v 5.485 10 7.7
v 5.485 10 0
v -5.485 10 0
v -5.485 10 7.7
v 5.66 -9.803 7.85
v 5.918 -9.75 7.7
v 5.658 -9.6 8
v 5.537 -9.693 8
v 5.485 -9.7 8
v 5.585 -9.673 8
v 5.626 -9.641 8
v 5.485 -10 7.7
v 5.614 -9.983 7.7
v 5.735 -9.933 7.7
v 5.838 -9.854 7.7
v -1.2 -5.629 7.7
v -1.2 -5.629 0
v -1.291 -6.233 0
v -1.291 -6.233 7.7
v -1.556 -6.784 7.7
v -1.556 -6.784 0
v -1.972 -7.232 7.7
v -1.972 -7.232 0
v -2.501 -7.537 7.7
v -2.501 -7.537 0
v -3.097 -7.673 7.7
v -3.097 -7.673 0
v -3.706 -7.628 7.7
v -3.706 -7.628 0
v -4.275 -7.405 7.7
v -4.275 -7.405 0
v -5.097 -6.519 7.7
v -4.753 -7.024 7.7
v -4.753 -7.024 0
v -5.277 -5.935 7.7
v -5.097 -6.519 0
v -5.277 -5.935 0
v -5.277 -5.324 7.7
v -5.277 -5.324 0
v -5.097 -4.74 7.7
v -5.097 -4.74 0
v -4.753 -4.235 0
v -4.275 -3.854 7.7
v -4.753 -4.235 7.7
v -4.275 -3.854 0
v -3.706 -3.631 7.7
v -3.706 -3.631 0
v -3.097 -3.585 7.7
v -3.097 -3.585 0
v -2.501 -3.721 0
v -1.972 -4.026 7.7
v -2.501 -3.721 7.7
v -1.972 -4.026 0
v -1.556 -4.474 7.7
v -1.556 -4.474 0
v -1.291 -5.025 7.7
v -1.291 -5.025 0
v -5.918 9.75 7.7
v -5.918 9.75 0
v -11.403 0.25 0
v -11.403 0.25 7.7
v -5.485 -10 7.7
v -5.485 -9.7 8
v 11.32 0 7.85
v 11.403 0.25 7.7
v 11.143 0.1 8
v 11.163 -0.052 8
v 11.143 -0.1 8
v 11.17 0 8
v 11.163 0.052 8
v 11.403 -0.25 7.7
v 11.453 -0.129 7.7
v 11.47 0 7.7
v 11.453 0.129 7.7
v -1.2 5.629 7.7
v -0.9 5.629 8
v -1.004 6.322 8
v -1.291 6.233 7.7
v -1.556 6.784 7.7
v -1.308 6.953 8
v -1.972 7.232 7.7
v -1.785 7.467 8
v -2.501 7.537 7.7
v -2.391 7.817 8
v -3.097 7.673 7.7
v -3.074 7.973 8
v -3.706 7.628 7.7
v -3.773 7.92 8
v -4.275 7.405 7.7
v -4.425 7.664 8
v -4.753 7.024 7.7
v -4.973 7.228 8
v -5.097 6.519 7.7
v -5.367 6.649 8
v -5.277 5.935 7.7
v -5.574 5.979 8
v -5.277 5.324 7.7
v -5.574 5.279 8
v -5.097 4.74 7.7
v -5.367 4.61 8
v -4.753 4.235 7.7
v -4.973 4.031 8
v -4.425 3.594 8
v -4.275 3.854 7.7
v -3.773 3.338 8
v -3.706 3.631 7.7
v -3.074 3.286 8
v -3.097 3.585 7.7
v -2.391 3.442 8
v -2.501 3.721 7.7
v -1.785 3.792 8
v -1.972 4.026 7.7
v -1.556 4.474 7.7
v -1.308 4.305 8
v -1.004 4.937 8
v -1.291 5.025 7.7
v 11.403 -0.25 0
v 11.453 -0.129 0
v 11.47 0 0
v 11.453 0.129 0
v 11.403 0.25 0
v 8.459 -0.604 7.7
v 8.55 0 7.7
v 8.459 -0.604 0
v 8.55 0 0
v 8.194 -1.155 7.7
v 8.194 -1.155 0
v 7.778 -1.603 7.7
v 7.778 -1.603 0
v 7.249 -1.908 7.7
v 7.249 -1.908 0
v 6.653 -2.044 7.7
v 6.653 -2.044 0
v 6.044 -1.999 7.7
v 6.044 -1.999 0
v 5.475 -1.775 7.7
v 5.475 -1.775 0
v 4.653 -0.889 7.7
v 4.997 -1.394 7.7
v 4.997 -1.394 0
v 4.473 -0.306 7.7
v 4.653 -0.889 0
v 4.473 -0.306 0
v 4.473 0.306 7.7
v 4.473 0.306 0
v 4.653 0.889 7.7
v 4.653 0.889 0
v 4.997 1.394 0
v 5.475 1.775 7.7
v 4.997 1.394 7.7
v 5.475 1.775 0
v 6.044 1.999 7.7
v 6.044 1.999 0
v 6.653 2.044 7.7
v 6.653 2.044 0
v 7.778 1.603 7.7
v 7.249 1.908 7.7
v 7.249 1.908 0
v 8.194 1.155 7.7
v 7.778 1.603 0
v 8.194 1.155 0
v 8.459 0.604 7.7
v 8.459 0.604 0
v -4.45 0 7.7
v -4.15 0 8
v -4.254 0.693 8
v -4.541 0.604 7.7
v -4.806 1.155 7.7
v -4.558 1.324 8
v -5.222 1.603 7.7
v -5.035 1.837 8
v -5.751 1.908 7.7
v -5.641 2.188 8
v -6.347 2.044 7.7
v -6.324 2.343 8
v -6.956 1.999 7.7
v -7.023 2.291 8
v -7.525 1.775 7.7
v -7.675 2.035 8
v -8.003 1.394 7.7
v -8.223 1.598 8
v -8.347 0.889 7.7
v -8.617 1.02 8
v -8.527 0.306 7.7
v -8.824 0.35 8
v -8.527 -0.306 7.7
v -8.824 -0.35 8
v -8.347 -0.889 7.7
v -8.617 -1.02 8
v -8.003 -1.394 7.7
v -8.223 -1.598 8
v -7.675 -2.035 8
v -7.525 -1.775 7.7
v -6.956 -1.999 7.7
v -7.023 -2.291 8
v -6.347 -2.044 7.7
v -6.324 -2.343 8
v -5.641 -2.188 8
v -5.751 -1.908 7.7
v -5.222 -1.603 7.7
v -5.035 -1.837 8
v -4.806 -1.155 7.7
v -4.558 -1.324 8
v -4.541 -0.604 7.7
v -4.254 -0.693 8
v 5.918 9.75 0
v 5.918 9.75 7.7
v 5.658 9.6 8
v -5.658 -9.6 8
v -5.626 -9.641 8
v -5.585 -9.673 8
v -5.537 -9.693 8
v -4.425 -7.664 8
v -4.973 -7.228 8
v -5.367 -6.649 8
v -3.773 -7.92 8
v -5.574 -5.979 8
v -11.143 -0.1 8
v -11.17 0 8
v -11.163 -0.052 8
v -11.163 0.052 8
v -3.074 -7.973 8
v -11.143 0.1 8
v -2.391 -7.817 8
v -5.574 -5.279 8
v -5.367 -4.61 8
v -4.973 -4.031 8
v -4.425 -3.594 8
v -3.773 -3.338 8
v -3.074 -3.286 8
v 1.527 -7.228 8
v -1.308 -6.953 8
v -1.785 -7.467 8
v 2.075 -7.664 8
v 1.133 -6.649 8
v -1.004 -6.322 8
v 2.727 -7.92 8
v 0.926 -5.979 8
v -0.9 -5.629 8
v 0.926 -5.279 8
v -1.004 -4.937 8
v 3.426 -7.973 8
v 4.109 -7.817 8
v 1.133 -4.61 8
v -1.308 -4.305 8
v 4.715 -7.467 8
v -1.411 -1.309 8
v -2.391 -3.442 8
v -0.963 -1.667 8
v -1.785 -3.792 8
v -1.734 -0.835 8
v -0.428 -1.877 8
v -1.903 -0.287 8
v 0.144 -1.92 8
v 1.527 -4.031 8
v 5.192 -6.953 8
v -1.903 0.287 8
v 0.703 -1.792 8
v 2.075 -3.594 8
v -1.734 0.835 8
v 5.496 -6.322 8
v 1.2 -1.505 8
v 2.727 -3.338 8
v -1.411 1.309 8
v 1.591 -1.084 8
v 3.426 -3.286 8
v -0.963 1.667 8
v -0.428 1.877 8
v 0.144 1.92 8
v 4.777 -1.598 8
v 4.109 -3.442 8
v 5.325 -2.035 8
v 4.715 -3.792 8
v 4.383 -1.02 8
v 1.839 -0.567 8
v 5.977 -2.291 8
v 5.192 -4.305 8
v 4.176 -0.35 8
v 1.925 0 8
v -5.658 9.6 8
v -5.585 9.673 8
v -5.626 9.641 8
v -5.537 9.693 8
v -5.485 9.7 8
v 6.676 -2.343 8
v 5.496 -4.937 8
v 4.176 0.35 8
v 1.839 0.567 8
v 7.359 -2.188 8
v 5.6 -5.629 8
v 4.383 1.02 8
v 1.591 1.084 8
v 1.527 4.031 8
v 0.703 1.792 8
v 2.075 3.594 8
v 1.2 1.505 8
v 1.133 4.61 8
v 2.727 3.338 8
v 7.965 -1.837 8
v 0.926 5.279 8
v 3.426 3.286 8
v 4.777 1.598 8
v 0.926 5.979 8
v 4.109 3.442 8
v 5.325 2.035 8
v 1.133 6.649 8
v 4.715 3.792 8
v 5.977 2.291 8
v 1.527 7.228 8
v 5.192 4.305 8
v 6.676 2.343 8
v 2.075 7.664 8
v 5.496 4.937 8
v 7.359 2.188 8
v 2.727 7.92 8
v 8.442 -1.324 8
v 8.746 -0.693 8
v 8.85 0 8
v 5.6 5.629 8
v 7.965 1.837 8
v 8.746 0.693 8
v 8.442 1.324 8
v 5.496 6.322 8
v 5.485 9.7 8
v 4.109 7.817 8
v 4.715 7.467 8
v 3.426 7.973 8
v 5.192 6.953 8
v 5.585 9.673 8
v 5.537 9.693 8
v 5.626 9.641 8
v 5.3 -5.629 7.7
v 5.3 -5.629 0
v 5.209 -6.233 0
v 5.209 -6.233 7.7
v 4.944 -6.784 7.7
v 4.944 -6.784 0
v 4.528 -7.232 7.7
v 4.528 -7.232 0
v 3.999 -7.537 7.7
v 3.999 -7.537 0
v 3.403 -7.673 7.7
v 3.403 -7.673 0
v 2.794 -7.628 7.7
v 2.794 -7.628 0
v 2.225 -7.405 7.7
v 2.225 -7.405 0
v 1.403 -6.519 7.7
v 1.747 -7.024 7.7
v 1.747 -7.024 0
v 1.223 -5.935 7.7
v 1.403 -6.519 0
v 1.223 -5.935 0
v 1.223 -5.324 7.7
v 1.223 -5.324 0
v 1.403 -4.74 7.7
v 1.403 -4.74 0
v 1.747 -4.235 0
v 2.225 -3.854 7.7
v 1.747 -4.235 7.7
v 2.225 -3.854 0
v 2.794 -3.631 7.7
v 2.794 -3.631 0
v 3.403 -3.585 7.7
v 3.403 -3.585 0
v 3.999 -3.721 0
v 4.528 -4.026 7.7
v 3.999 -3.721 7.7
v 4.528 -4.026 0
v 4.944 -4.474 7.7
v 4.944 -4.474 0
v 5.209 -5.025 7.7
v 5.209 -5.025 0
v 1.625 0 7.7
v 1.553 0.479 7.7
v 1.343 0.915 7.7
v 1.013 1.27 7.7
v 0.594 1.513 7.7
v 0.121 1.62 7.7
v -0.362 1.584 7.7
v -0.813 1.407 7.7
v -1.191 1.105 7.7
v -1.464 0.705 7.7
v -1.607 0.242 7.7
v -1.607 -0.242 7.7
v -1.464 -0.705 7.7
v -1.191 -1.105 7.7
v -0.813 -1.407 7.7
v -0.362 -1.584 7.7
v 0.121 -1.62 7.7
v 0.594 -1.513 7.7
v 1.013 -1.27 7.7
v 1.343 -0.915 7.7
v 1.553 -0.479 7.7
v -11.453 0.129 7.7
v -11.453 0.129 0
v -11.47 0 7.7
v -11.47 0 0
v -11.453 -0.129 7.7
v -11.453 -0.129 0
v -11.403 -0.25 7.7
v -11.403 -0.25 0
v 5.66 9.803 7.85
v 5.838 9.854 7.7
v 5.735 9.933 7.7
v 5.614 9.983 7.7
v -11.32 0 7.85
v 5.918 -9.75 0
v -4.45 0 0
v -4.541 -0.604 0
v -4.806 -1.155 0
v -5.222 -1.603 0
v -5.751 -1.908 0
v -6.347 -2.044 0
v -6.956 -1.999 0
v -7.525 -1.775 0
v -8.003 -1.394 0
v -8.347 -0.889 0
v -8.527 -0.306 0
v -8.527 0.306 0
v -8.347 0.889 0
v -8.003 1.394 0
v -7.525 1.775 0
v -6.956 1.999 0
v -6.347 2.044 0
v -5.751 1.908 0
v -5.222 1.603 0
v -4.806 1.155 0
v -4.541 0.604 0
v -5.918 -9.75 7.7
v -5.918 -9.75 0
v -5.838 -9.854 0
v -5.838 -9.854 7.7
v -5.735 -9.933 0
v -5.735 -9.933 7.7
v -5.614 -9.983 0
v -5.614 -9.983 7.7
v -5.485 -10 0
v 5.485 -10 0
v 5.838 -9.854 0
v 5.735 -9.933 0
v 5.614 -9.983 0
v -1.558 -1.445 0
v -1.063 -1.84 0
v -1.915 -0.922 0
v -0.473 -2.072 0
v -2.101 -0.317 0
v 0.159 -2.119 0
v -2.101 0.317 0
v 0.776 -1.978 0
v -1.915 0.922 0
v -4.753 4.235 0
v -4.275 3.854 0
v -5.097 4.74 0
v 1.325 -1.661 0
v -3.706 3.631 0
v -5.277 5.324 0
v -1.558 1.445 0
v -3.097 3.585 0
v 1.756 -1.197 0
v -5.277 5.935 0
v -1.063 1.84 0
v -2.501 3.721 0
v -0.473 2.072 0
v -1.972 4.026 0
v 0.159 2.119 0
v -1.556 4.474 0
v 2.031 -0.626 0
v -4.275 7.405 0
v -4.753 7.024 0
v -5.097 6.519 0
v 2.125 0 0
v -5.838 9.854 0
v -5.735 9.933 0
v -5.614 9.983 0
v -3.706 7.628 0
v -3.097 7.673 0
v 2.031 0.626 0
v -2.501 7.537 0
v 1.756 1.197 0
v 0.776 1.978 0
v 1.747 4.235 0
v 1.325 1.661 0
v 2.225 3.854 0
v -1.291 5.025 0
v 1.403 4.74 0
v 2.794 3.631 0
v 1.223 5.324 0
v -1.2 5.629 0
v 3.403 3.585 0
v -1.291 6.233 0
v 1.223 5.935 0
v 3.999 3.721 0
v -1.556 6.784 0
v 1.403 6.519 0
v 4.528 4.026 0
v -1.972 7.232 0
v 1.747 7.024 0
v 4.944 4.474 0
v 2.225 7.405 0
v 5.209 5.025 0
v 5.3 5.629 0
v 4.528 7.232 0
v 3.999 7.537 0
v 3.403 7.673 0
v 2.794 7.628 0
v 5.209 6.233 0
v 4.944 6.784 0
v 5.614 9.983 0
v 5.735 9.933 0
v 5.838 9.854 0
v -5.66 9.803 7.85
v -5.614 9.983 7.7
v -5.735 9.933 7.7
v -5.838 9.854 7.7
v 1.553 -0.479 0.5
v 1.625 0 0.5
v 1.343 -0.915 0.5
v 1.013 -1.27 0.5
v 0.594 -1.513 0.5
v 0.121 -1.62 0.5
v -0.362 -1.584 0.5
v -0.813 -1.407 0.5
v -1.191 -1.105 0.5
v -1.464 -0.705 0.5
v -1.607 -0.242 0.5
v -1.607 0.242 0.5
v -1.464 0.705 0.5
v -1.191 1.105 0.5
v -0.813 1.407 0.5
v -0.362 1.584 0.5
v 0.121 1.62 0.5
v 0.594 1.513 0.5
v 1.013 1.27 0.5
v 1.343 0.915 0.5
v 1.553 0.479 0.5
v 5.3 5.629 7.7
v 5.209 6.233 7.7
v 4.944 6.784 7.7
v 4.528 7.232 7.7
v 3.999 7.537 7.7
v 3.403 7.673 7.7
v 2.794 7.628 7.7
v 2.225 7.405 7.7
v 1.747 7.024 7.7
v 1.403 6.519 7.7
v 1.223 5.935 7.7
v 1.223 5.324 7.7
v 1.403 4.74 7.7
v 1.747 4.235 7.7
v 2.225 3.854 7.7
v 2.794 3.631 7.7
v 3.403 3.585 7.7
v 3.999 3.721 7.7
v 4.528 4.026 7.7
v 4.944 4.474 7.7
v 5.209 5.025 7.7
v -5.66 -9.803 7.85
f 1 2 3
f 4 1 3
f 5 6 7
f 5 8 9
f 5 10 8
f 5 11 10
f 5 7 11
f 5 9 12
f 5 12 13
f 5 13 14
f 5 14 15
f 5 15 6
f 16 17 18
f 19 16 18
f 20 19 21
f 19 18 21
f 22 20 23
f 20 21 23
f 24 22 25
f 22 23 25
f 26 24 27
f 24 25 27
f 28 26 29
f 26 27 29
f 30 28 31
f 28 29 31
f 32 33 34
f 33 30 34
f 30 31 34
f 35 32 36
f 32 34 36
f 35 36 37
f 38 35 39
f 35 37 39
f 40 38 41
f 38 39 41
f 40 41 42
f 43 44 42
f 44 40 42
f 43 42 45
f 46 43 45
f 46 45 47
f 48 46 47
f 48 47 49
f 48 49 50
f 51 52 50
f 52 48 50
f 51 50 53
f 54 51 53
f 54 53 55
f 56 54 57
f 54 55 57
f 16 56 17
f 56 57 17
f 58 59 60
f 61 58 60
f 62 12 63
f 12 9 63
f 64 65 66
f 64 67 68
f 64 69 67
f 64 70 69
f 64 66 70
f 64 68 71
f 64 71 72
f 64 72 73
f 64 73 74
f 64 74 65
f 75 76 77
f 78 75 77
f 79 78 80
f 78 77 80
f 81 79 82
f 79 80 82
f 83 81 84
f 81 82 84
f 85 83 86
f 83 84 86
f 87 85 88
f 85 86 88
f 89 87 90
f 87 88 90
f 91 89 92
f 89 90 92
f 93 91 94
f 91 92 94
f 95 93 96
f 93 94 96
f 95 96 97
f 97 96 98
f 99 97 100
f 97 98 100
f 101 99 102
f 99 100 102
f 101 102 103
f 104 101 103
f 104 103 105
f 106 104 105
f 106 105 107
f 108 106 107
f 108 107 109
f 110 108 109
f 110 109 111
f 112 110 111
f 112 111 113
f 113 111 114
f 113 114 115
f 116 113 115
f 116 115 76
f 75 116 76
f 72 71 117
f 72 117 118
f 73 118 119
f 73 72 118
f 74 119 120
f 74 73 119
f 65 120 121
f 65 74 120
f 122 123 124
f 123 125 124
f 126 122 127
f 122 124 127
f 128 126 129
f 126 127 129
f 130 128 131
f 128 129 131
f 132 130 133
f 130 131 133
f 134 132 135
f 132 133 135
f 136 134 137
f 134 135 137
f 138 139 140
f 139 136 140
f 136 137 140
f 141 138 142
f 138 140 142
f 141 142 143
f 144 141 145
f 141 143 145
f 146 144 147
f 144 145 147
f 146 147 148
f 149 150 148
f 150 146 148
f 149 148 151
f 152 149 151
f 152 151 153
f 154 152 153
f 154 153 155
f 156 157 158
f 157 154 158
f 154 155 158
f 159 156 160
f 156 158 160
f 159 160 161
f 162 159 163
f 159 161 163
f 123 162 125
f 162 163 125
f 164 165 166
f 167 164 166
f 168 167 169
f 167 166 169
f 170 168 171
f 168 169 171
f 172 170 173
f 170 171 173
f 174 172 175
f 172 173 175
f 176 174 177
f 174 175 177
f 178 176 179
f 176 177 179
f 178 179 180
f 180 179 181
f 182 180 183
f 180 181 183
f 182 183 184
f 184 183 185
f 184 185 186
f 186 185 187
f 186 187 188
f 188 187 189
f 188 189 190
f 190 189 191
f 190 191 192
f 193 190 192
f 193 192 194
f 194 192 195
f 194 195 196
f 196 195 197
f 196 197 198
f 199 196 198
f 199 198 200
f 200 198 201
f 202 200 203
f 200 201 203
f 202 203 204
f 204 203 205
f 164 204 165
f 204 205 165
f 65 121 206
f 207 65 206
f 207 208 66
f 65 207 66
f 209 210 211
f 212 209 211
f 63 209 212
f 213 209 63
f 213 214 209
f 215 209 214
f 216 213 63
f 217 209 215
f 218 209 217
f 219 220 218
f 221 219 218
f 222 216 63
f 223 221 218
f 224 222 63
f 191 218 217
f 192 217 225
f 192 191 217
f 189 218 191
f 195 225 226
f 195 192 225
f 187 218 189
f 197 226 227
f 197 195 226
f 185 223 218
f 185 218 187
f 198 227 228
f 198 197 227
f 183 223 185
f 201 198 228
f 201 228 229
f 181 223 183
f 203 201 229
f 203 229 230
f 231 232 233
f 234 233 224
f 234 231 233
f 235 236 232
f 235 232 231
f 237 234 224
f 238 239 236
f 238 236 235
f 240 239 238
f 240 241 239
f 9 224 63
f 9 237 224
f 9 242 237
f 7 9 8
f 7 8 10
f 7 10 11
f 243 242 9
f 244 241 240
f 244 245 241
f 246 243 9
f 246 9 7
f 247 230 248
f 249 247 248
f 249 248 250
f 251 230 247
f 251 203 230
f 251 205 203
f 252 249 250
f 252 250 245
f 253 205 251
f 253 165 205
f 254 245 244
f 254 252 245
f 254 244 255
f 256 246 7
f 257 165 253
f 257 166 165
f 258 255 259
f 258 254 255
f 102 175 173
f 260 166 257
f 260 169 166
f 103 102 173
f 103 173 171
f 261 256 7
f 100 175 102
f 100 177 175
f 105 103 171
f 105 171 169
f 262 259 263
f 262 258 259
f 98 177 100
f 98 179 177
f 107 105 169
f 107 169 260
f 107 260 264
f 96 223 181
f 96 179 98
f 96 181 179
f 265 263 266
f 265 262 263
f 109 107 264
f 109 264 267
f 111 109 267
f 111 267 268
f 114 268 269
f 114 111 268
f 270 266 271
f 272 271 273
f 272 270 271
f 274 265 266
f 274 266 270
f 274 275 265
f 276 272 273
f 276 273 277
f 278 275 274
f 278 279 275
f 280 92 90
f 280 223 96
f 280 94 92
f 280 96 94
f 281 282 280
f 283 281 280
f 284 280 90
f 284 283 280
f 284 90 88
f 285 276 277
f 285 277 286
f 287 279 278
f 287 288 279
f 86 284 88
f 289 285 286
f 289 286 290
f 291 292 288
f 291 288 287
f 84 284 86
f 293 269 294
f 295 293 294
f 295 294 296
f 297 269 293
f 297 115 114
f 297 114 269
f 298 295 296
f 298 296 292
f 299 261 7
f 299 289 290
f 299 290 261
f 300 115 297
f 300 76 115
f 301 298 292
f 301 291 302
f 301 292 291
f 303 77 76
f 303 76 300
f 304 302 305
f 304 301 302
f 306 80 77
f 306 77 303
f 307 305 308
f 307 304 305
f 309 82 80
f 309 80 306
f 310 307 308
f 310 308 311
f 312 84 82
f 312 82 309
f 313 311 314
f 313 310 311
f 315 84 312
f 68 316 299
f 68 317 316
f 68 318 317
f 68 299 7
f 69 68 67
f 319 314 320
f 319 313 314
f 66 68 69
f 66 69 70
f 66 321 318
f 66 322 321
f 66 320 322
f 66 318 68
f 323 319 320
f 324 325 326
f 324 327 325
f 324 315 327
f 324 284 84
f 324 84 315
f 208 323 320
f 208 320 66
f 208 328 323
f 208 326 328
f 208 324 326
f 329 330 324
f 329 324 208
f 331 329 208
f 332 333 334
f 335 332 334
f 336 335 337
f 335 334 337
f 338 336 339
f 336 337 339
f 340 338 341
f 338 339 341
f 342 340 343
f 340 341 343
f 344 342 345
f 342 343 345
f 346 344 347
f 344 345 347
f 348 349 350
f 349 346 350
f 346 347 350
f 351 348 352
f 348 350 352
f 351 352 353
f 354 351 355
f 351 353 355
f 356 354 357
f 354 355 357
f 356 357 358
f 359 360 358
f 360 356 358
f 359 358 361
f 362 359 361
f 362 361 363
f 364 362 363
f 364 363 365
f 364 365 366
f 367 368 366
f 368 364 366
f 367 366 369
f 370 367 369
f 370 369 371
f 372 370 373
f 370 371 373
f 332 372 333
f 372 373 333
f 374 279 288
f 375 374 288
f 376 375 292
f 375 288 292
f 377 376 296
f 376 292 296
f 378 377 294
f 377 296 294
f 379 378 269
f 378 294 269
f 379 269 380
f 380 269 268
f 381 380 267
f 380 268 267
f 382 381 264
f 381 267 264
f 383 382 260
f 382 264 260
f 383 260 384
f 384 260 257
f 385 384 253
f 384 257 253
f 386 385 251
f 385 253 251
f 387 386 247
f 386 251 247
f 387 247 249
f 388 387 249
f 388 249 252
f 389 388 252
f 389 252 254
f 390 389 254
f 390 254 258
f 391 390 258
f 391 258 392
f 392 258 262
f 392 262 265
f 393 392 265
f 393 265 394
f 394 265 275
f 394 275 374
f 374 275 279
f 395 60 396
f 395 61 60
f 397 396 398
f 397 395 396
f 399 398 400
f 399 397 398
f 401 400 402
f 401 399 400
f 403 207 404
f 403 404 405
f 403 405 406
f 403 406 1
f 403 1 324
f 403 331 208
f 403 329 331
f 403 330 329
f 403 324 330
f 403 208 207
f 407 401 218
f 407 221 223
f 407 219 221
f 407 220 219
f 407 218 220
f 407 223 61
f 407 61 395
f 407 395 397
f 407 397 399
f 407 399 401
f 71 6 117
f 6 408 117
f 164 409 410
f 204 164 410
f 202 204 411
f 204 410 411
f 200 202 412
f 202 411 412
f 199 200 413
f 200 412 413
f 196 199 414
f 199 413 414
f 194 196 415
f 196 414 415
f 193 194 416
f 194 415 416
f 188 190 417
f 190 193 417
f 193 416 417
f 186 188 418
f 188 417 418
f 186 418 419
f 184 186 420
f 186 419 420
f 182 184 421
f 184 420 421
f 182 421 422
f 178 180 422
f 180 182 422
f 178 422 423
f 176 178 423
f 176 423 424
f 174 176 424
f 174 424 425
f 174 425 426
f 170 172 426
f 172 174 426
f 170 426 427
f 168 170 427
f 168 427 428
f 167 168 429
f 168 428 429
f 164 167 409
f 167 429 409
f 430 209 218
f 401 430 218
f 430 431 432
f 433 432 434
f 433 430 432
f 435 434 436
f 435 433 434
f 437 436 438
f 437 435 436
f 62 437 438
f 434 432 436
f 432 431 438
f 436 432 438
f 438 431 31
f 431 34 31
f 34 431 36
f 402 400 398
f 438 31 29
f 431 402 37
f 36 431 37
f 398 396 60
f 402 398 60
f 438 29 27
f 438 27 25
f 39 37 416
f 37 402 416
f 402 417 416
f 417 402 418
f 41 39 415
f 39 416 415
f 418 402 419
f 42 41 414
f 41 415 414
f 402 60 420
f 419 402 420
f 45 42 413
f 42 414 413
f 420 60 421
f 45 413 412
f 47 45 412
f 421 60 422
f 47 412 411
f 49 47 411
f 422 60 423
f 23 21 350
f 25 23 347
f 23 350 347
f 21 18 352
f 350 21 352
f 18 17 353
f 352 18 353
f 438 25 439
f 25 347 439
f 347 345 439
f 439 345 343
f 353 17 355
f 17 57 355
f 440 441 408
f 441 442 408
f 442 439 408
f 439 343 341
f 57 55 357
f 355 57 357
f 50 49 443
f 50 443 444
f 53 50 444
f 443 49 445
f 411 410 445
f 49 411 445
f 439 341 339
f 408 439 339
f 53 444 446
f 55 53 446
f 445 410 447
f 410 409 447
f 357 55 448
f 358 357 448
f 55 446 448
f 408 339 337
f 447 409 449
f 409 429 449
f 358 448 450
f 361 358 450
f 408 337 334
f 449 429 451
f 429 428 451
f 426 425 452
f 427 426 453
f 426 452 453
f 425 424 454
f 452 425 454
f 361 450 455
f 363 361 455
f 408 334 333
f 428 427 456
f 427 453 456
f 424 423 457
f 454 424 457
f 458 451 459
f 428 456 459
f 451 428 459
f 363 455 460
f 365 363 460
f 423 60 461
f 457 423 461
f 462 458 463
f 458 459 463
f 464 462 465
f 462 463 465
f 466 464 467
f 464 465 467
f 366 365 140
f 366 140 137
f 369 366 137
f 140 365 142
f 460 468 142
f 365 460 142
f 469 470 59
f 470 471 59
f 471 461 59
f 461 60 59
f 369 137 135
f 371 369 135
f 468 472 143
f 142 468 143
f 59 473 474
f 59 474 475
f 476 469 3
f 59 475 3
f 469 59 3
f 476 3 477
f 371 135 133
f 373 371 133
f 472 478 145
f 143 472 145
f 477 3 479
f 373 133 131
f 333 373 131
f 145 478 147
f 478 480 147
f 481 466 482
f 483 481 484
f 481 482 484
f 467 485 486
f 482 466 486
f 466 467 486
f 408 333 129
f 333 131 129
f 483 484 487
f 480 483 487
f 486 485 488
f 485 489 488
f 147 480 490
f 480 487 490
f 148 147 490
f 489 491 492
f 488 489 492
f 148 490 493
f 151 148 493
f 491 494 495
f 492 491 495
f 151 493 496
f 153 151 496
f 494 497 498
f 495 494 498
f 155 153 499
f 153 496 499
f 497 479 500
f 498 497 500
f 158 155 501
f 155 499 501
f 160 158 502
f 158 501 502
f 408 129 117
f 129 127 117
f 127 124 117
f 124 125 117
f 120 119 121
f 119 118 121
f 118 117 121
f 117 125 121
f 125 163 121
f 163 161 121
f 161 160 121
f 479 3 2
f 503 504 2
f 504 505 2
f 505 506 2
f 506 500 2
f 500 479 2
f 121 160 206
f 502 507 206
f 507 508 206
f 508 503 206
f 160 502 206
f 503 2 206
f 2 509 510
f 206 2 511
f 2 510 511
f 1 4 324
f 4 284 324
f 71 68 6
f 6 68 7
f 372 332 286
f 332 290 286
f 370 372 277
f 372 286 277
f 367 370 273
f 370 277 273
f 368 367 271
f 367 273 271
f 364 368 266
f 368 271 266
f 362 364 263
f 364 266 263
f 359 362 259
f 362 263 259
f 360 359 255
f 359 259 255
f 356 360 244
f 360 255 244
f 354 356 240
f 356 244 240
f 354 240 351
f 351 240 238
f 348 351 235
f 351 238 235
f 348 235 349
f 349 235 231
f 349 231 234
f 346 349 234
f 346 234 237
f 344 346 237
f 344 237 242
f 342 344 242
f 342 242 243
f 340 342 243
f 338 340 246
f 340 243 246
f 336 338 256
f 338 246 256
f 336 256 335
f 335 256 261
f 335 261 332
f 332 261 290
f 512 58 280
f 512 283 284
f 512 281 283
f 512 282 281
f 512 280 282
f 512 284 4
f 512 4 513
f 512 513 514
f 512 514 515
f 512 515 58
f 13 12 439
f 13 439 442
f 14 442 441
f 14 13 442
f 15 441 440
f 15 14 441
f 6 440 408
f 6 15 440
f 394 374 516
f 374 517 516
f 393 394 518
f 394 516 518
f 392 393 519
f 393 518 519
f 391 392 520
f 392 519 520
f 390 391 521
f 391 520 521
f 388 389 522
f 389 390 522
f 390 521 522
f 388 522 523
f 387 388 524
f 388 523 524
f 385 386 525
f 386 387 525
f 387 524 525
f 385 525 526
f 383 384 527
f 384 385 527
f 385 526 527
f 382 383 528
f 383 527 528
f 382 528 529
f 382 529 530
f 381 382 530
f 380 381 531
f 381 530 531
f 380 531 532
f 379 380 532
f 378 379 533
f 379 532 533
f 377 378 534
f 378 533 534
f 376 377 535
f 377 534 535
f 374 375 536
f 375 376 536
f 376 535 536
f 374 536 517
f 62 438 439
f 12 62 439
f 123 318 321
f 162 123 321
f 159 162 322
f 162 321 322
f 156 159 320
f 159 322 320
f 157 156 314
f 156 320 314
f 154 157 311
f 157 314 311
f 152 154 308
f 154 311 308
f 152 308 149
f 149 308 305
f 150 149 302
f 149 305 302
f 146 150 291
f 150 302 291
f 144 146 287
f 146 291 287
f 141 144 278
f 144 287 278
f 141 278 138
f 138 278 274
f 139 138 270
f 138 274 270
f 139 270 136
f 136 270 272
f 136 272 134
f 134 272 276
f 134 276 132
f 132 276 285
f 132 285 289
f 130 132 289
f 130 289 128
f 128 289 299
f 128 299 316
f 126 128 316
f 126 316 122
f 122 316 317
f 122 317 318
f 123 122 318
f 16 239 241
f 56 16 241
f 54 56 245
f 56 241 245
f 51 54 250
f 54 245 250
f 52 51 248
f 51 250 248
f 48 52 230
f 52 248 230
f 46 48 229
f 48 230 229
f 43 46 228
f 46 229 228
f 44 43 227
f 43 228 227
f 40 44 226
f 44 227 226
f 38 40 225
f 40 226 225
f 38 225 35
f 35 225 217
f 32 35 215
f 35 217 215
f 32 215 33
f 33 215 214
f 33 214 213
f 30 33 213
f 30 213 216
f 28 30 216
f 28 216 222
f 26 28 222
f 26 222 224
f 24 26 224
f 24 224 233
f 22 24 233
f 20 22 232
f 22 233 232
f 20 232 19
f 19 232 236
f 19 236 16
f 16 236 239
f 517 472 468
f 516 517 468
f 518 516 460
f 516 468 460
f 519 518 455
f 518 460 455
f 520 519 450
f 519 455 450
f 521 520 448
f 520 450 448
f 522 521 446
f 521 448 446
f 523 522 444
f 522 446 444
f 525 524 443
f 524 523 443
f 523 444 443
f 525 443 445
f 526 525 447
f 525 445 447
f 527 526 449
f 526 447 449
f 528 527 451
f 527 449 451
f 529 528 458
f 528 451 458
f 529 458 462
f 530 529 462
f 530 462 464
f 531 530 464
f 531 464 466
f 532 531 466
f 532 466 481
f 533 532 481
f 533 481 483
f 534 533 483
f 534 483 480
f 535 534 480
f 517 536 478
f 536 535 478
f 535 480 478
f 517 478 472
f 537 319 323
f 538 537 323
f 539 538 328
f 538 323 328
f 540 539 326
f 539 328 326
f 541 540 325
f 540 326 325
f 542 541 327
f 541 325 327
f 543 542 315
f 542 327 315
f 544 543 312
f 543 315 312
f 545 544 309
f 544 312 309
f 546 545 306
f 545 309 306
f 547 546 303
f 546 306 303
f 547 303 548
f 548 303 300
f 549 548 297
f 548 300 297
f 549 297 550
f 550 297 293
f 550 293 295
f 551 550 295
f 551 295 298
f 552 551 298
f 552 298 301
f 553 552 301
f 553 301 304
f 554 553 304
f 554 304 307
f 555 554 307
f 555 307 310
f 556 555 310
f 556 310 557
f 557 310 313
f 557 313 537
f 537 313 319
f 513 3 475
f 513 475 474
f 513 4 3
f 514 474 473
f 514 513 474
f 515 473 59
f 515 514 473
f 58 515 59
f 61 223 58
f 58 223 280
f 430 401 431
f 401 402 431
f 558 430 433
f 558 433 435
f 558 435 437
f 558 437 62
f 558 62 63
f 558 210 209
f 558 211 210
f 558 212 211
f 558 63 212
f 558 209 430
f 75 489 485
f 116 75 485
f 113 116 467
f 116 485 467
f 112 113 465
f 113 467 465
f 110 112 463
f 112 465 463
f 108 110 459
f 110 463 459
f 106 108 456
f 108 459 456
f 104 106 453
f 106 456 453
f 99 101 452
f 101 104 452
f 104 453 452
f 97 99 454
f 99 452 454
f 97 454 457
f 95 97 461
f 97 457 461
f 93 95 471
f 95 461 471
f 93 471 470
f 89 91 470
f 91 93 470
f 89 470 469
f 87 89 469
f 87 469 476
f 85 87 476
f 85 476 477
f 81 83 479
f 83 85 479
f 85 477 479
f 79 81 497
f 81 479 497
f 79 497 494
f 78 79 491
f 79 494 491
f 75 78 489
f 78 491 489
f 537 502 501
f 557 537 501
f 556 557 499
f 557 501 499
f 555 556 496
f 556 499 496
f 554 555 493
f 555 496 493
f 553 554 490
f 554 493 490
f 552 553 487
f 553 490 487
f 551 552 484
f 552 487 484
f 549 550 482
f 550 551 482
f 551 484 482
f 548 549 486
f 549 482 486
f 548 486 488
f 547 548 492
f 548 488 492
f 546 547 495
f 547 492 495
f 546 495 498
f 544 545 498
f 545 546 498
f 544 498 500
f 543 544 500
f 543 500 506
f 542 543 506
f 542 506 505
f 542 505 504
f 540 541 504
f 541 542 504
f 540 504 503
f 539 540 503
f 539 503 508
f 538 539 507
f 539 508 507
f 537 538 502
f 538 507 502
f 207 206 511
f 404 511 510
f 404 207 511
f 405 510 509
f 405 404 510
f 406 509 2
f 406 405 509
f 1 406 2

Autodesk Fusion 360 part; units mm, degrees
sketch "Sketch1" plane through (0, 0, 0) normal (0, 0, 1) x (1, 0, 0)
  line L0 (-5.7735, 10) -> (-11.547, 0)
  line L1 (-11.547, 0) -> (-5.7735, -10)
  line L2 (-5.7735, -10) -> (5.7735, -10)
  line L3 (5.7735, -10) -> (11.547, 0)
  line L4 (11.547, 0) -> (5.7735, 10)
  line L5 (5.7735, 10) -> (-5.7735, 10)
  circle A0 centre (0, 0) radius 1.625
  circle A1 centre (-3.25, 5.6292) radius 2.05
  line L6 (0, 0) -> (-5.7735, 10) construction
  circle A2 centre (-6.5, 0) radius 2.05
  circle A3 centre (-3.25, -5.6292) radius 2.05
  circle A4 centre (3.25, -5.6292) radius 2.05
  circle A5 centre (6.5, 0) radius 2.05
  circle A6 centre (3.25, 5.6292) radius 2.05
  circle A7 centre (0, 0) radius 6.5 construction
  dimension "d1" = 10
  dimension "d2" = 3.25
  dimension "d4" = 4.1
  dimension "d9" = 360
  dimension "d10" = 13
extrude "Extrude1" add sketch "Sketch1" along normal blind 8
chamfer "Chamfer2" distance 0.3 angle 45 7 edges at (-8.4113, 0.7413, 8) (-5.1613, 6.3705, 8) (-1.515, 0.5876, 8) (-5.1613, -4.8879, 8) (1.3387, -4.8879, 8) (4.5887, 0.7413, 8) (1.3387, 6.3705, 8)
chamfer "Chamfer3" distance 0.5 angle 45 1 edges at (-1.515, 0.5876, 0)
fillet "Fillet1" radius 0.5 6 edges at (-5.7735, -10, 4) (5.7735, -10, 4) (11.547, 0, 4) (5.7735, 10, 4) (-5.7735, 10, 4) (-11.547, 0, 4)
chamfer "Chamfer4" distance 0.3 angle 45 12 edges at (0, -10, 8) (5.7348, -9.933, 8) (8.6603, -5, 8) (11.4697, 0, 8) (8.6603, 5, 8) (5.7348, 9.933, 8) (0, 10, 8) (-5.7348, 9.933, 8) (-8.6603, 5, 8) (-11.4697, 0, 8) (-8.6603, -5, 8) (-5.7348, -9.933, 8)
